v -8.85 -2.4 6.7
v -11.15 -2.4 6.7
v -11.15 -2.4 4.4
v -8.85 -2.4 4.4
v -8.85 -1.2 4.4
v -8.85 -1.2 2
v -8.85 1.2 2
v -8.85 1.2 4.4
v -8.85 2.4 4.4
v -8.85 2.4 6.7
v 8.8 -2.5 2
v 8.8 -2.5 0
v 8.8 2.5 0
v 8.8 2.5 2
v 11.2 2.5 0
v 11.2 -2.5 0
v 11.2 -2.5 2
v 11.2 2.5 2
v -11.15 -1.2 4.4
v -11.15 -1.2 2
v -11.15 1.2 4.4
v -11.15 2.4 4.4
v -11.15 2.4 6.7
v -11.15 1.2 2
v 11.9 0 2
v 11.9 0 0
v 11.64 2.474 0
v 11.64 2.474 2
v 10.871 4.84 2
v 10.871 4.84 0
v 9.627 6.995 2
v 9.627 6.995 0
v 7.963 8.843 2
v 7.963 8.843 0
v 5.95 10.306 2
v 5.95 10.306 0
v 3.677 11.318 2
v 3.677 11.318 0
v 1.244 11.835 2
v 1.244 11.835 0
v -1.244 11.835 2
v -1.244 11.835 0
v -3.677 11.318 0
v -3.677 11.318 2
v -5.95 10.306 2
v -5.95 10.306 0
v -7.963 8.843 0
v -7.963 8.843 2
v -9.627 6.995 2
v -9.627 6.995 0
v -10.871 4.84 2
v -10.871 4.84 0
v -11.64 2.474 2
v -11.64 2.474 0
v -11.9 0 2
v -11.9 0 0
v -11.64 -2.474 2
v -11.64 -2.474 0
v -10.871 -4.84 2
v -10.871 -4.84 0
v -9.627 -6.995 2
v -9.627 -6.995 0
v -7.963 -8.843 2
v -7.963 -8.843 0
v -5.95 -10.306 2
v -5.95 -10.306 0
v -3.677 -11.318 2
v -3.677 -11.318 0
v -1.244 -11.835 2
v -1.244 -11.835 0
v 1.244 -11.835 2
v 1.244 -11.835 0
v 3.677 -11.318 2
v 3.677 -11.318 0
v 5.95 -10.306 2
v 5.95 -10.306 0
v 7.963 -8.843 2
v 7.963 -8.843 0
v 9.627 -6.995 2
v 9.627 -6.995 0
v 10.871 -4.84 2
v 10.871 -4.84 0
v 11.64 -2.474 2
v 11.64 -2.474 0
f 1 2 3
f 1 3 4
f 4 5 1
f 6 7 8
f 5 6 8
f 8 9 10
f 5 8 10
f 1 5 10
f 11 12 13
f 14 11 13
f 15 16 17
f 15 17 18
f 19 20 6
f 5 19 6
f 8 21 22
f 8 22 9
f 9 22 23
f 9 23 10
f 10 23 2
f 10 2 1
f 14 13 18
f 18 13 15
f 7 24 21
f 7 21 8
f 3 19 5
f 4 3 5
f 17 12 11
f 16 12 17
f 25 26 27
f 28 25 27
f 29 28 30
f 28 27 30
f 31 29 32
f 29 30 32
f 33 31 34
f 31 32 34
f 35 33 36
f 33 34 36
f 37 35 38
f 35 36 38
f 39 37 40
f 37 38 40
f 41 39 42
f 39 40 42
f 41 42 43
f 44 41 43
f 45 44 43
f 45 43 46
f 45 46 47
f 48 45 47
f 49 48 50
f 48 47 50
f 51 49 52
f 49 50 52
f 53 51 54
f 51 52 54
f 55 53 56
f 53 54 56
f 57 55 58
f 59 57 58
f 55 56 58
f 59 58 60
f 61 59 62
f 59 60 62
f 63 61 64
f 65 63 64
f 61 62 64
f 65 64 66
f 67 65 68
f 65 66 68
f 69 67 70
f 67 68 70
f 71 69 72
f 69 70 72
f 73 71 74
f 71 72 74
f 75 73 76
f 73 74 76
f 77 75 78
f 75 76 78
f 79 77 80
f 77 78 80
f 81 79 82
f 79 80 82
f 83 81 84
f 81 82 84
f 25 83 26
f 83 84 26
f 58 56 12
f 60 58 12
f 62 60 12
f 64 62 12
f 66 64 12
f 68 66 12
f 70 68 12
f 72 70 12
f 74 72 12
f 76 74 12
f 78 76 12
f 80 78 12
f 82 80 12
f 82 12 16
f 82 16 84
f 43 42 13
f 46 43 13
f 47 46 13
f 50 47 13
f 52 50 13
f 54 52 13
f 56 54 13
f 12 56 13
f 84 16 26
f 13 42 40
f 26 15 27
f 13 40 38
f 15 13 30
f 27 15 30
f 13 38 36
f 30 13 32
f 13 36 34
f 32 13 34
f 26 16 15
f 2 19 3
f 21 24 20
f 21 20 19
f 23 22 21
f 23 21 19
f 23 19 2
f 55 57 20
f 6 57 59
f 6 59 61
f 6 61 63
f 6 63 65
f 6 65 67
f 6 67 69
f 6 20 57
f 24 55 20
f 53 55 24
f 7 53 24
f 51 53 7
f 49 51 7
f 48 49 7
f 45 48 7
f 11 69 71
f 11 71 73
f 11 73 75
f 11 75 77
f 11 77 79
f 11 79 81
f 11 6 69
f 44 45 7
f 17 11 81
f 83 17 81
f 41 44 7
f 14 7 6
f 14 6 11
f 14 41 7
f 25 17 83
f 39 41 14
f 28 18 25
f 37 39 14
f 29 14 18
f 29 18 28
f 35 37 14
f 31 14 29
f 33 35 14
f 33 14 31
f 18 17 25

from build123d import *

# Parameters (mm, degrees)
SKETCH1_R           = 11.9
SKETCH1_W           = 2.4
SKETCH1_H           = 5
BOSS_EXTRUDE2_DEPTH = 2
SKETCH2_W           = 2.3
SKETCH2_H           = 2.4
BOSS_EXTRUDE3_DEPTH = 4.7
SKETCH4_W           = 2.3
SKETCH4_H           = 2.3
BOSS_EXTRUDE5_DEPTH = 1.2
SKETCH5_W           = 2.3
SKETCH5_H           = 2.3
BOSS_EXTRUDE6_DEPTH = 1.2


with BuildPart() as part:
    # Sketch1 → Boss-Extrude2 (new body)
    with BuildSketch(Plane.XY):
        Circle(SKETCH1_R)
        with Locations((10, 0)):
            Rectangle(SKETCH1_W, SKETCH1_H, mode=Mode.SUBTRACT)
    extrude(amount=BOSS_EXTRUDE2_DEPTH)

    # Sketch2 → Boss-Extrude3 (add)
    with BuildSketch(Plane.XY.offset(2)):
        with Locations((-10, 0)):
            Rectangle(SKETCH2_W, SKETCH2_H)
    extrude(amount=BOSS_EXTRUDE3_DEPTH)

    # Sketch4 → Boss-Extrude5 (add)
    with BuildSketch(Plane(origin=(0, 1.2, 0), x_dir=(1, 0, 0), z_dir=(0, 1, 0))):
        with Locations((-10, -5.55)):
            Rectangle(SKETCH4_W, SKETCH4_H)
    extrude(amount=BOSS_EXTRUDE5_DEPTH)

    # Sketch5 → Boss-Extrude6 (add)
    with BuildSketch(Plane.XZ.offset(1.2)):
        with Locations((-10, 5.55)):
            Rectangle(SKETCH5_W, SKETCH5_H)
    extrude(amount=BOSS_EXTRUDE6_DEPTH)


solid = part.part
